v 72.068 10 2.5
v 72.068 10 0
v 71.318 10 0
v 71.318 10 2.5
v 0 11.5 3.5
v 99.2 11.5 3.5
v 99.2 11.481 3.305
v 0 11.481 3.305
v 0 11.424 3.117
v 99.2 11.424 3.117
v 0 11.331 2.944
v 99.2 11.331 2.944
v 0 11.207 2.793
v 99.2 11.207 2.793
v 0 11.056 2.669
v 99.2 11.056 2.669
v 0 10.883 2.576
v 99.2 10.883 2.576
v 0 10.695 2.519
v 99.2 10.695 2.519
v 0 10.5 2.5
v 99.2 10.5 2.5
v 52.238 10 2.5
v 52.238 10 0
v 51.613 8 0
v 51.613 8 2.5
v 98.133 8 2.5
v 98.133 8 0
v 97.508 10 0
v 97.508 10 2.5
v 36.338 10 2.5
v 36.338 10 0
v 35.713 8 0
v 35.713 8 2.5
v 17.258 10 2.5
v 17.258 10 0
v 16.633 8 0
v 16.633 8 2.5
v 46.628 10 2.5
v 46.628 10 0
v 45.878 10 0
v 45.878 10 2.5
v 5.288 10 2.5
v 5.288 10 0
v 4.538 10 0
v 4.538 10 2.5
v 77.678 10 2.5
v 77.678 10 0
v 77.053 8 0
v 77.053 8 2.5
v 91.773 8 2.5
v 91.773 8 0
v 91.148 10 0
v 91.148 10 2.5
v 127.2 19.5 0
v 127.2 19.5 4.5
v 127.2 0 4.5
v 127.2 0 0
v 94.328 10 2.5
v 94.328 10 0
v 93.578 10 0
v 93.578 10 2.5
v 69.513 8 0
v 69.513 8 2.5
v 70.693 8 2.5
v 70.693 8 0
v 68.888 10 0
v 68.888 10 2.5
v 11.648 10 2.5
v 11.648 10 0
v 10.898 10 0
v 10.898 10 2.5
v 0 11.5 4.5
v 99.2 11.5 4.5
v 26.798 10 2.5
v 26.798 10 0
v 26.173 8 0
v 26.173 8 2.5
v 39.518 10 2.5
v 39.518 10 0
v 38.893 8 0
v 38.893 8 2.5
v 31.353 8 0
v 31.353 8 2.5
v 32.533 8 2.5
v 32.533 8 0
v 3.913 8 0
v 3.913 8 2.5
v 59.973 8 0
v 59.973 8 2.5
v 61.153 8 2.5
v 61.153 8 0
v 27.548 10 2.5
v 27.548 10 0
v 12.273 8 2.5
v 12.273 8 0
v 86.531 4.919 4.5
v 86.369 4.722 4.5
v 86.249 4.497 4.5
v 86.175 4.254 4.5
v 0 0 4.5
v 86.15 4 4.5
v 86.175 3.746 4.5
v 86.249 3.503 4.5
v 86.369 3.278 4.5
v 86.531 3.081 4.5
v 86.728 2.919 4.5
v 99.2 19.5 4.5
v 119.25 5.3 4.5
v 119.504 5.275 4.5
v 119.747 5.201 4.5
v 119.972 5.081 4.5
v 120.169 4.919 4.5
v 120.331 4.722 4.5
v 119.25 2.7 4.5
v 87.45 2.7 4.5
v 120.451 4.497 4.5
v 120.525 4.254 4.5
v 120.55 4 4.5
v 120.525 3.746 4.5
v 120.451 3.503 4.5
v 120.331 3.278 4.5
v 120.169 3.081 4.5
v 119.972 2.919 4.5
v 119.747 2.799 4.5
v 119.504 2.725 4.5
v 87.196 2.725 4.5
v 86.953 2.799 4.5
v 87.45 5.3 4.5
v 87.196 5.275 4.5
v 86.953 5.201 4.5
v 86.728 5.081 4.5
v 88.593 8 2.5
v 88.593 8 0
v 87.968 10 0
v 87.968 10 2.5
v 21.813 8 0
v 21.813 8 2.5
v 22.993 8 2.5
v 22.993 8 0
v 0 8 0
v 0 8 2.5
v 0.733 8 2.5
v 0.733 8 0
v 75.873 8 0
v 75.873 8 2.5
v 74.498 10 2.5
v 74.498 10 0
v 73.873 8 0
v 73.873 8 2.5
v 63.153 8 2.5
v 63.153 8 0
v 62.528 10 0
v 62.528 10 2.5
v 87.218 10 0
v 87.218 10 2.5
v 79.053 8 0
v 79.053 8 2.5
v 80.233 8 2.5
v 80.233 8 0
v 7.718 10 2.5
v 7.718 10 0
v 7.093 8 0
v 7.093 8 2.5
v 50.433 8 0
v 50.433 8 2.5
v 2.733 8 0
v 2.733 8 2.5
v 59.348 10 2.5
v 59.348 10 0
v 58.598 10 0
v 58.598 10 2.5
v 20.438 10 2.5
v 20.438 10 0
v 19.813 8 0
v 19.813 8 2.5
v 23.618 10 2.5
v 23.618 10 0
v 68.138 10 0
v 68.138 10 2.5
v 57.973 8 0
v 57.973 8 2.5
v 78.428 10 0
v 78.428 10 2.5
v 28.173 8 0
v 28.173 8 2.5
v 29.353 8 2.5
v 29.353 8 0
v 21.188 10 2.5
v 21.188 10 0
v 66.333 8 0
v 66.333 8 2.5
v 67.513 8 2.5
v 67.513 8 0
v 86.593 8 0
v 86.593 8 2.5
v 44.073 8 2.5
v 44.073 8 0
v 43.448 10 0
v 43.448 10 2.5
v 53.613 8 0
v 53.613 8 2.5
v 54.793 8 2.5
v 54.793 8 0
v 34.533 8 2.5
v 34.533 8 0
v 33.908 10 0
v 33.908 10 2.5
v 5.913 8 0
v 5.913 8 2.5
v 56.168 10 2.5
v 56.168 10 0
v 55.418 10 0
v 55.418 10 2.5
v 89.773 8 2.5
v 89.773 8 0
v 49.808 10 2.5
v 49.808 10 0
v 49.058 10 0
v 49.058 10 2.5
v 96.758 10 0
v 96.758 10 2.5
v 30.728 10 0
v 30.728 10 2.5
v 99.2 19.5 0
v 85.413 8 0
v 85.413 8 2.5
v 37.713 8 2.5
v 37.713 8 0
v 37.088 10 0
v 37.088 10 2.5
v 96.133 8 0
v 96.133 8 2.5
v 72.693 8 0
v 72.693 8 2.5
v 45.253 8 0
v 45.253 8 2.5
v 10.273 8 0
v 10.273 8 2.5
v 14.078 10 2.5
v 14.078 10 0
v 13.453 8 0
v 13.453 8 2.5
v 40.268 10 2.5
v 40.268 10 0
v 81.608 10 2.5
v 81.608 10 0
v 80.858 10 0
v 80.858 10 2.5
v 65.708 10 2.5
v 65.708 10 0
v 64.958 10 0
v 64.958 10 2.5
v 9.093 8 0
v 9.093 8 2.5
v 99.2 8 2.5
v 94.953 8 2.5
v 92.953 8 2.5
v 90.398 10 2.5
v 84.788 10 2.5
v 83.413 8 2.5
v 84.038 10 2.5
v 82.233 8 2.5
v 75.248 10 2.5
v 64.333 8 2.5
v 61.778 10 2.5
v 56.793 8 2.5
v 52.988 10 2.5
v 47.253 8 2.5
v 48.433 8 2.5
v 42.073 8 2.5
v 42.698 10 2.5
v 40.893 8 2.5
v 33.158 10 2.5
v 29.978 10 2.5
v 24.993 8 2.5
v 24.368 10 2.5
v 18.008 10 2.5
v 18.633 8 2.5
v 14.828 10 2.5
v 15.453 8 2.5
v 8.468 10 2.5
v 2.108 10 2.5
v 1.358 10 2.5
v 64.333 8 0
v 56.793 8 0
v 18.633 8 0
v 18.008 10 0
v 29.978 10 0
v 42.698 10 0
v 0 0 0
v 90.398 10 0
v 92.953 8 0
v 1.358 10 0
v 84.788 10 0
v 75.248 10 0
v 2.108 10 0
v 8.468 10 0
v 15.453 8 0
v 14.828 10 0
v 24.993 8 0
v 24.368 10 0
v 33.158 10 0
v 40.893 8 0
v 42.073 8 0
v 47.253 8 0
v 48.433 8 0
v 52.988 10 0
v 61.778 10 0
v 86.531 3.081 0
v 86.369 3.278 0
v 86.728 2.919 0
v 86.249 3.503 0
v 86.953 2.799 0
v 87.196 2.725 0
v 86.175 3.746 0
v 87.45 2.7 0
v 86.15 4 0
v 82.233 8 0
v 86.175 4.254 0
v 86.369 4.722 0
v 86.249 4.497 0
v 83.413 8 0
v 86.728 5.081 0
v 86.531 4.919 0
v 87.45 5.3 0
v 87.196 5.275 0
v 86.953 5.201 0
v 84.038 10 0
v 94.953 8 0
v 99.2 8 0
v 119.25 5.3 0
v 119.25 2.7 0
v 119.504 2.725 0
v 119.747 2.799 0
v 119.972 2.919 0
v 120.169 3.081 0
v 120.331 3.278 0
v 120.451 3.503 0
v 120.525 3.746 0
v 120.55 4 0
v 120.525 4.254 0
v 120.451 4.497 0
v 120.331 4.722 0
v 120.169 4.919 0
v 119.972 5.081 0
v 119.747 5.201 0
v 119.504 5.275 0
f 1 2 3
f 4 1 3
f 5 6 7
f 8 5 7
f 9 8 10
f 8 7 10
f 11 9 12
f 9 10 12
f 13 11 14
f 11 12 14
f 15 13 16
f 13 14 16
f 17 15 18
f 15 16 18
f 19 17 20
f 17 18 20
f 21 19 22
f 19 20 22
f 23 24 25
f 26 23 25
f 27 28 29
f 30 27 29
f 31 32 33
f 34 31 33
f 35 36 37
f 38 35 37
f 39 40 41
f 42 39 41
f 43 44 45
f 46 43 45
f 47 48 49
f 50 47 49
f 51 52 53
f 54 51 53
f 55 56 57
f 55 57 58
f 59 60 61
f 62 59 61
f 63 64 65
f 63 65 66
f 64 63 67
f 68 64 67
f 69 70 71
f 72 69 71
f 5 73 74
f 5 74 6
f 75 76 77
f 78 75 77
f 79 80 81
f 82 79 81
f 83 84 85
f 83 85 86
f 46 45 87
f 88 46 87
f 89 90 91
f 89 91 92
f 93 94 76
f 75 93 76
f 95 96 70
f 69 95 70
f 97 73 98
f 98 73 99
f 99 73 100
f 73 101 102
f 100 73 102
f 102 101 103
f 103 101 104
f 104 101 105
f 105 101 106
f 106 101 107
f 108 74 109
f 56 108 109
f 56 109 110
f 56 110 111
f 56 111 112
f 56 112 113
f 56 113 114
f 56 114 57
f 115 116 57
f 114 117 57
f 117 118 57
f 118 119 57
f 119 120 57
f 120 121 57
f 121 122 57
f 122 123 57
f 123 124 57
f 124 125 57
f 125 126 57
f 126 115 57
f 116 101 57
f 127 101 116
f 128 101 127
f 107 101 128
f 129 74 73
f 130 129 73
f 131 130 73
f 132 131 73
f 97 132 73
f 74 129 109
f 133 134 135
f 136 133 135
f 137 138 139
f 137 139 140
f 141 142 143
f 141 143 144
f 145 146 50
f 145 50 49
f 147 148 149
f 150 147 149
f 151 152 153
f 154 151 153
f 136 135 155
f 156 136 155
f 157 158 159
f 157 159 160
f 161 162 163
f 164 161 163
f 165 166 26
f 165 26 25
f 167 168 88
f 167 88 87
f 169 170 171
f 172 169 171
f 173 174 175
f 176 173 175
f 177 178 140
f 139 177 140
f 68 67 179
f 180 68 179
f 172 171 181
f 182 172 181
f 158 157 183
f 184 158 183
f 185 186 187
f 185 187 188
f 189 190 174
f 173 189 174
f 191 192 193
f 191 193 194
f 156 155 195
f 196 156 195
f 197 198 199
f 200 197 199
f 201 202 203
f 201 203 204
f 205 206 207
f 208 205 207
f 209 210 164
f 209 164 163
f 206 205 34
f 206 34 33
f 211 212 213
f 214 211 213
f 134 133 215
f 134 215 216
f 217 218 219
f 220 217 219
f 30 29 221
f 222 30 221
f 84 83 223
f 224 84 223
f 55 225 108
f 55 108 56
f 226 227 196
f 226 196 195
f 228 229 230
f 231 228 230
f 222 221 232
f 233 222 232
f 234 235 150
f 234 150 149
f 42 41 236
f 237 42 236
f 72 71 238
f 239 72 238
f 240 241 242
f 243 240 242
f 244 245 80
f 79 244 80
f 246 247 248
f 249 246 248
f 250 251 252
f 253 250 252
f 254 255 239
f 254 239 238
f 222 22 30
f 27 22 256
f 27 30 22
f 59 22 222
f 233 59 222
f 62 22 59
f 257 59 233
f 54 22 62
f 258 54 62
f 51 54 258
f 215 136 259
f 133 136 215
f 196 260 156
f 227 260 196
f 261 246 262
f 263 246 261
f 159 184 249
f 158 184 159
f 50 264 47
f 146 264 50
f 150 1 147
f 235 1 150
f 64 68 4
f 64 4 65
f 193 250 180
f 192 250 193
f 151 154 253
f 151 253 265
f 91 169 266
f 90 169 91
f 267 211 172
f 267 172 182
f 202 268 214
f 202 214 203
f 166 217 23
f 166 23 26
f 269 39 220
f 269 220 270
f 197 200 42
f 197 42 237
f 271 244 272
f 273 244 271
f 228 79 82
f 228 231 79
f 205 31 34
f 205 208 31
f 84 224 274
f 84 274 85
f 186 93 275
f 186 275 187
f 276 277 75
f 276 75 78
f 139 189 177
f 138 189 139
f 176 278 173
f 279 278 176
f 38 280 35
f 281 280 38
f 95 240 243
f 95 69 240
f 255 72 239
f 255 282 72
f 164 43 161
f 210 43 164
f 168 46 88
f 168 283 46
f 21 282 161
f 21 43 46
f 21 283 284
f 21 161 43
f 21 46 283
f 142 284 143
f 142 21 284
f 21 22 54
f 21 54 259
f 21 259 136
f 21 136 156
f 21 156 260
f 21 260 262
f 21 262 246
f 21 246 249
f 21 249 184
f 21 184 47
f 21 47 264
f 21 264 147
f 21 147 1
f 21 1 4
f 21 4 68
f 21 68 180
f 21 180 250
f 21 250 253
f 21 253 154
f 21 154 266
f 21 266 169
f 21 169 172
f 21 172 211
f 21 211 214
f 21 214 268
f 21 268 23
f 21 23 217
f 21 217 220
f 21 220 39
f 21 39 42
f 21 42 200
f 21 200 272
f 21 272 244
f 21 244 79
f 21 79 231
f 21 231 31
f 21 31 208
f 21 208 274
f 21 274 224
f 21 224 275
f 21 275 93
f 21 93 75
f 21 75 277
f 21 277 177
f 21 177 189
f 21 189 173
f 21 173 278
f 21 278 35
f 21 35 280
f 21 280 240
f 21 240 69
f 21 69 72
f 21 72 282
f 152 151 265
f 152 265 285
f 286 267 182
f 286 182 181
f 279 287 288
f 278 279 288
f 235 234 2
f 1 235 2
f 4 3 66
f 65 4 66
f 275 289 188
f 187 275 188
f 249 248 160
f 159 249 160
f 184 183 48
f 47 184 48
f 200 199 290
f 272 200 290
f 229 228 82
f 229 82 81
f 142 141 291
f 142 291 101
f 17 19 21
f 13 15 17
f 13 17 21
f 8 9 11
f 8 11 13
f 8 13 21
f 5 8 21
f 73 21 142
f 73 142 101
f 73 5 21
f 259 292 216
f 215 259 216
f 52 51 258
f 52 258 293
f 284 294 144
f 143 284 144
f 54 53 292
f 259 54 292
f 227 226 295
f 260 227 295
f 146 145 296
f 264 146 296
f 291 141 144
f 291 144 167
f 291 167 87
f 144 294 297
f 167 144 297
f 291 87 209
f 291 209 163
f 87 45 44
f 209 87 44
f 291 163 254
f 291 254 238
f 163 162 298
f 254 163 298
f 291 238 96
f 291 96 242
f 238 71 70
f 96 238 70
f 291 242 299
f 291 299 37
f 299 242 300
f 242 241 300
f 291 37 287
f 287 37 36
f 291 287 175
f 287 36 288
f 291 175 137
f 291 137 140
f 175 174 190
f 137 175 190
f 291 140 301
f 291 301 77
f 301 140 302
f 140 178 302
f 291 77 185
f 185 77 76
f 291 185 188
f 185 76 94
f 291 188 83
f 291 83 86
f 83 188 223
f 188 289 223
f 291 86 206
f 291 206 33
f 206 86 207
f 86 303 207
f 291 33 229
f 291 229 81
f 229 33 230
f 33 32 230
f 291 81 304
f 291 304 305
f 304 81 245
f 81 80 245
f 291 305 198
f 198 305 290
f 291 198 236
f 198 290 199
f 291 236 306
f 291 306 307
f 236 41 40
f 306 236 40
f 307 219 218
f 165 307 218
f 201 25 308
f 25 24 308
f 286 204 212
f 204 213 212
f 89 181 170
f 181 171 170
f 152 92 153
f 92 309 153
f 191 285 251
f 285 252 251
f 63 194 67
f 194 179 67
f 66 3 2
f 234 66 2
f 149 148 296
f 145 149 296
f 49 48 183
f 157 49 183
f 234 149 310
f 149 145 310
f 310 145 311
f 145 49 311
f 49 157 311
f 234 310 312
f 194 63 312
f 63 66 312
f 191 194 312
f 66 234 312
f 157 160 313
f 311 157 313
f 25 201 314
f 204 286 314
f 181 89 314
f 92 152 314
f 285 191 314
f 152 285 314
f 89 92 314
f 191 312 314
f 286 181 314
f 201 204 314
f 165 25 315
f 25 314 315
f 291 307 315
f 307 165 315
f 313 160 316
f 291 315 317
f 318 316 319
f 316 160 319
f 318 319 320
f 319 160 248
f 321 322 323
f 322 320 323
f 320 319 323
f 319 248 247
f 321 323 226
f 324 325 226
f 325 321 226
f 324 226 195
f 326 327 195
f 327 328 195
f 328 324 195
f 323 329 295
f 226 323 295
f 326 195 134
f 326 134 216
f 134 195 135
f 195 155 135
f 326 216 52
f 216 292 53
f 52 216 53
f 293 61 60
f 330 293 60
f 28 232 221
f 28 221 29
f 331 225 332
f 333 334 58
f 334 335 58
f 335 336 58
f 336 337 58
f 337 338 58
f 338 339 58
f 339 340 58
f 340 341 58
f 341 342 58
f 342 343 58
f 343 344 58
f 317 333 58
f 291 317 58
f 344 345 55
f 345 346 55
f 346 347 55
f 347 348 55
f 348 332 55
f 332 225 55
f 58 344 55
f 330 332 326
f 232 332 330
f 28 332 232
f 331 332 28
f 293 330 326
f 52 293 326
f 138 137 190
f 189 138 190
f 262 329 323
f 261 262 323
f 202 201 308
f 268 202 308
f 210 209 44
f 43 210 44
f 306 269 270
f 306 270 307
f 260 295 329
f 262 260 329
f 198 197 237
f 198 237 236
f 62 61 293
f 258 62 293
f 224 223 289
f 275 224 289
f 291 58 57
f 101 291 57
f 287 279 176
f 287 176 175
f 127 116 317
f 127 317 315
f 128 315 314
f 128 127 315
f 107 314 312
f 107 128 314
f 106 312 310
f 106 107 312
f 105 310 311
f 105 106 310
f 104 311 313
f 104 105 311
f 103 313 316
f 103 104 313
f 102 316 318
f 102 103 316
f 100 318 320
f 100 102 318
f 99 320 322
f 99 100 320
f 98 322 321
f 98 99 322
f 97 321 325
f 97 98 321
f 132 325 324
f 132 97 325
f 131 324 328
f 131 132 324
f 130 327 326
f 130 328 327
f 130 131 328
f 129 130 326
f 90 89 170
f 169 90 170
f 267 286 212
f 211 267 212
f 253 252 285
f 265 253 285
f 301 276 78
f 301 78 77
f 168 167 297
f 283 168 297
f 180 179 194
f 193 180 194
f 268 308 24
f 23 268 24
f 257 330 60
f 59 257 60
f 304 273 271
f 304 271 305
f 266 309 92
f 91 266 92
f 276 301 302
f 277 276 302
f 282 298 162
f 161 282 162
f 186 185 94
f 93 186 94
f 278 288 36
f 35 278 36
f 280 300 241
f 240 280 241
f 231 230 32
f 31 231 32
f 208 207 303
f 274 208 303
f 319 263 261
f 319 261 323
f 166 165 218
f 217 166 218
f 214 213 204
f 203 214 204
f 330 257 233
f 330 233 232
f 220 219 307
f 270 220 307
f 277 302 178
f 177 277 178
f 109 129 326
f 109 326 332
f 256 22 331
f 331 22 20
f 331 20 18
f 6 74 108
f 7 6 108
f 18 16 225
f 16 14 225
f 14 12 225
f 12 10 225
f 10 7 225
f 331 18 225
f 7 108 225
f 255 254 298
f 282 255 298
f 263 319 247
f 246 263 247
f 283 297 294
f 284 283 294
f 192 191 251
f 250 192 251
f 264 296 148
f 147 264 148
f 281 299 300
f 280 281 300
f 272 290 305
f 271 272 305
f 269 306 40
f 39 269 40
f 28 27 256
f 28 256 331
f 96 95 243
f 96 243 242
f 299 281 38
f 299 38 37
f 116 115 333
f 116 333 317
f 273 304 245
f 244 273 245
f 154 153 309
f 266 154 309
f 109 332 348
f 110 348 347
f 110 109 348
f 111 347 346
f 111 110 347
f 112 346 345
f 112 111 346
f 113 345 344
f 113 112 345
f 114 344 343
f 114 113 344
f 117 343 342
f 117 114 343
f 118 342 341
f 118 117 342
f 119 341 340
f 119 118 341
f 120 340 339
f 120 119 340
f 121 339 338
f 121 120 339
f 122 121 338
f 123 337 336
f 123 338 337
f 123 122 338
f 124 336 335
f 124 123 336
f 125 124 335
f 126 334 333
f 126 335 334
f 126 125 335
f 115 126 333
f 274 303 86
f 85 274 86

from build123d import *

# Parameters (mm, degrees)
BOSS_EXTRUDE3_DEPTH             = 127.2
CUT_EXTRUDE1_DEPTH              = 128.798043803
BOSS_EXTRUDE5_REACH             = 129.798
LPATTERN3_COUNT                 = 30
LPATTERN3_PITCH                 = 3.18
LPATTERN3_COL_COUNT             = 11
LPATTERN3_COL_PITCH             = 3.18
FILLET2_R                       = 1
SKETCH9_W                       = 28
SKETCH9_H                       = 4.5
BOSS_EXTRUDE6_DEPTH             = 8
BOSS_EXTRUDE6_DIRECTION_2_REACH = 129.798


with BuildPart() as part:
    # Sketch4 → Boss-Extrude3 (new body)
    with BuildSketch(Plane(origin=(0, 0, 0), x_dir=(0, 0, -1), z_dir=(1, 0, 0))):
        Polygon((0, 0), (-4.5, 0), (-4.5, 11.5), (-2.5, 11.5), (-2.5, 8), (0, 8), align=None)
    extrude(amount=BOSS_EXTRUDE3_DEPTH)

    # Sketch6 → Cut-Extrude1 (cut, through all)
    with BuildSketch(Plane.XY.offset(4.5)):
        with BuildLine():
            Line((87.45, 5.3), (119.25, 5.3))
            ThreePointArc((119.25, 5.3), (120.55, 4), (119.25, 2.7))
            Line((119.25, 2.7), (87.45, 2.7))
            ThreePointArc((87.45, 2.7), (86.15, 4), (87.45, 5.3))
        make_face()
    extrude(amount=-CUT_EXTRUDE1_DEPTH, mode=Mode.SUBTRACT)

    # Sketch8 → Boss-Extrude5 (add, up to next)
    with BuildSketch(Plane(origin=(0, 0, 0), x_dir=(-1, 0, 0), z_dir=(0, 0, -1)), mode=Mode.PRIVATE) as boss_extrude5_sk1:
        Polygon((-94.952664599, 8), (-94.327664599, 10), (-93.577664599, 10), (-92.952664599, 8), align=None)
    boss_extrude5_tool1 = extrude(boss_extrude5_sk1.sketch, amount=-BOSS_EXTRUDE5_REACH, mode=Mode.PRIVATE) - part.part
    boss_extrude5 = boss_extrude5_tool1.solids().sort_by_distance((93.952665, 8.848485, 0))[0]
    add(boss_extrude5)

    # LPattern3: Boss-Extrude5 ×30
    with Locations(*[(-i * LPATTERN3_PITCH, 0, 0) for i in range(1, LPATTERN3_COUNT)]):
        add(boss_extrude5)

    # LPattern3 col: Boss-Extrude5 ×11
    with Locations(*[(i * LPATTERN3_COL_PITCH, 0, 0) for i in range(1, LPATTERN3_COL_COUNT)]):
        add(boss_extrude5)

    # Fillet2
    fillet2_edges = [part.edges().sort_by_distance(p)[0] for p in [
        (63.6, 11.5, 2.5),
    ]]
    fillet(fillet2_edges, radius=FILLET2_R)

    # Sketch9 → Boss-Extrude6 (add)
    with BuildSketch(Plane(origin=(0, 11.5, 0), x_dir=(1, 0, 0), z_dir=(0, 1, 0))):
        with Locations((113.2, -2.25)):
            Rectangle(SKETCH9_W, SKETCH9_H)
    extrude(amount=BOSS_EXTRUDE6_DEPTH)

    # Sketch9 → Boss-Extrude6 direction 2 (add, up to next)
    with BuildSketch(Plane(origin=(0, 11.5, 0), x_dir=(1, 0, 0), z_dir=(0, 1, 0)), mode=Mode.PRIVATE) as boss_extrude6_direction_2_sk1:
        with Locations((113.2, -2.25)):
            Rectangle(SKETCH9_W, SKETCH9_H)
    boss_extrude6_direction_2_tool1 = extrude(boss_extrude6_direction_2_sk1.sketch, amount=-BOSS_EXTRUDE6_DIRECTION_2_REACH, mode=Mode.PRIVATE) - part.part
    add(boss_extrude6_direction_2_tool1.solids().sort_by_distance((113.2, 11.5, 2.25))[0])


solid = part.part
